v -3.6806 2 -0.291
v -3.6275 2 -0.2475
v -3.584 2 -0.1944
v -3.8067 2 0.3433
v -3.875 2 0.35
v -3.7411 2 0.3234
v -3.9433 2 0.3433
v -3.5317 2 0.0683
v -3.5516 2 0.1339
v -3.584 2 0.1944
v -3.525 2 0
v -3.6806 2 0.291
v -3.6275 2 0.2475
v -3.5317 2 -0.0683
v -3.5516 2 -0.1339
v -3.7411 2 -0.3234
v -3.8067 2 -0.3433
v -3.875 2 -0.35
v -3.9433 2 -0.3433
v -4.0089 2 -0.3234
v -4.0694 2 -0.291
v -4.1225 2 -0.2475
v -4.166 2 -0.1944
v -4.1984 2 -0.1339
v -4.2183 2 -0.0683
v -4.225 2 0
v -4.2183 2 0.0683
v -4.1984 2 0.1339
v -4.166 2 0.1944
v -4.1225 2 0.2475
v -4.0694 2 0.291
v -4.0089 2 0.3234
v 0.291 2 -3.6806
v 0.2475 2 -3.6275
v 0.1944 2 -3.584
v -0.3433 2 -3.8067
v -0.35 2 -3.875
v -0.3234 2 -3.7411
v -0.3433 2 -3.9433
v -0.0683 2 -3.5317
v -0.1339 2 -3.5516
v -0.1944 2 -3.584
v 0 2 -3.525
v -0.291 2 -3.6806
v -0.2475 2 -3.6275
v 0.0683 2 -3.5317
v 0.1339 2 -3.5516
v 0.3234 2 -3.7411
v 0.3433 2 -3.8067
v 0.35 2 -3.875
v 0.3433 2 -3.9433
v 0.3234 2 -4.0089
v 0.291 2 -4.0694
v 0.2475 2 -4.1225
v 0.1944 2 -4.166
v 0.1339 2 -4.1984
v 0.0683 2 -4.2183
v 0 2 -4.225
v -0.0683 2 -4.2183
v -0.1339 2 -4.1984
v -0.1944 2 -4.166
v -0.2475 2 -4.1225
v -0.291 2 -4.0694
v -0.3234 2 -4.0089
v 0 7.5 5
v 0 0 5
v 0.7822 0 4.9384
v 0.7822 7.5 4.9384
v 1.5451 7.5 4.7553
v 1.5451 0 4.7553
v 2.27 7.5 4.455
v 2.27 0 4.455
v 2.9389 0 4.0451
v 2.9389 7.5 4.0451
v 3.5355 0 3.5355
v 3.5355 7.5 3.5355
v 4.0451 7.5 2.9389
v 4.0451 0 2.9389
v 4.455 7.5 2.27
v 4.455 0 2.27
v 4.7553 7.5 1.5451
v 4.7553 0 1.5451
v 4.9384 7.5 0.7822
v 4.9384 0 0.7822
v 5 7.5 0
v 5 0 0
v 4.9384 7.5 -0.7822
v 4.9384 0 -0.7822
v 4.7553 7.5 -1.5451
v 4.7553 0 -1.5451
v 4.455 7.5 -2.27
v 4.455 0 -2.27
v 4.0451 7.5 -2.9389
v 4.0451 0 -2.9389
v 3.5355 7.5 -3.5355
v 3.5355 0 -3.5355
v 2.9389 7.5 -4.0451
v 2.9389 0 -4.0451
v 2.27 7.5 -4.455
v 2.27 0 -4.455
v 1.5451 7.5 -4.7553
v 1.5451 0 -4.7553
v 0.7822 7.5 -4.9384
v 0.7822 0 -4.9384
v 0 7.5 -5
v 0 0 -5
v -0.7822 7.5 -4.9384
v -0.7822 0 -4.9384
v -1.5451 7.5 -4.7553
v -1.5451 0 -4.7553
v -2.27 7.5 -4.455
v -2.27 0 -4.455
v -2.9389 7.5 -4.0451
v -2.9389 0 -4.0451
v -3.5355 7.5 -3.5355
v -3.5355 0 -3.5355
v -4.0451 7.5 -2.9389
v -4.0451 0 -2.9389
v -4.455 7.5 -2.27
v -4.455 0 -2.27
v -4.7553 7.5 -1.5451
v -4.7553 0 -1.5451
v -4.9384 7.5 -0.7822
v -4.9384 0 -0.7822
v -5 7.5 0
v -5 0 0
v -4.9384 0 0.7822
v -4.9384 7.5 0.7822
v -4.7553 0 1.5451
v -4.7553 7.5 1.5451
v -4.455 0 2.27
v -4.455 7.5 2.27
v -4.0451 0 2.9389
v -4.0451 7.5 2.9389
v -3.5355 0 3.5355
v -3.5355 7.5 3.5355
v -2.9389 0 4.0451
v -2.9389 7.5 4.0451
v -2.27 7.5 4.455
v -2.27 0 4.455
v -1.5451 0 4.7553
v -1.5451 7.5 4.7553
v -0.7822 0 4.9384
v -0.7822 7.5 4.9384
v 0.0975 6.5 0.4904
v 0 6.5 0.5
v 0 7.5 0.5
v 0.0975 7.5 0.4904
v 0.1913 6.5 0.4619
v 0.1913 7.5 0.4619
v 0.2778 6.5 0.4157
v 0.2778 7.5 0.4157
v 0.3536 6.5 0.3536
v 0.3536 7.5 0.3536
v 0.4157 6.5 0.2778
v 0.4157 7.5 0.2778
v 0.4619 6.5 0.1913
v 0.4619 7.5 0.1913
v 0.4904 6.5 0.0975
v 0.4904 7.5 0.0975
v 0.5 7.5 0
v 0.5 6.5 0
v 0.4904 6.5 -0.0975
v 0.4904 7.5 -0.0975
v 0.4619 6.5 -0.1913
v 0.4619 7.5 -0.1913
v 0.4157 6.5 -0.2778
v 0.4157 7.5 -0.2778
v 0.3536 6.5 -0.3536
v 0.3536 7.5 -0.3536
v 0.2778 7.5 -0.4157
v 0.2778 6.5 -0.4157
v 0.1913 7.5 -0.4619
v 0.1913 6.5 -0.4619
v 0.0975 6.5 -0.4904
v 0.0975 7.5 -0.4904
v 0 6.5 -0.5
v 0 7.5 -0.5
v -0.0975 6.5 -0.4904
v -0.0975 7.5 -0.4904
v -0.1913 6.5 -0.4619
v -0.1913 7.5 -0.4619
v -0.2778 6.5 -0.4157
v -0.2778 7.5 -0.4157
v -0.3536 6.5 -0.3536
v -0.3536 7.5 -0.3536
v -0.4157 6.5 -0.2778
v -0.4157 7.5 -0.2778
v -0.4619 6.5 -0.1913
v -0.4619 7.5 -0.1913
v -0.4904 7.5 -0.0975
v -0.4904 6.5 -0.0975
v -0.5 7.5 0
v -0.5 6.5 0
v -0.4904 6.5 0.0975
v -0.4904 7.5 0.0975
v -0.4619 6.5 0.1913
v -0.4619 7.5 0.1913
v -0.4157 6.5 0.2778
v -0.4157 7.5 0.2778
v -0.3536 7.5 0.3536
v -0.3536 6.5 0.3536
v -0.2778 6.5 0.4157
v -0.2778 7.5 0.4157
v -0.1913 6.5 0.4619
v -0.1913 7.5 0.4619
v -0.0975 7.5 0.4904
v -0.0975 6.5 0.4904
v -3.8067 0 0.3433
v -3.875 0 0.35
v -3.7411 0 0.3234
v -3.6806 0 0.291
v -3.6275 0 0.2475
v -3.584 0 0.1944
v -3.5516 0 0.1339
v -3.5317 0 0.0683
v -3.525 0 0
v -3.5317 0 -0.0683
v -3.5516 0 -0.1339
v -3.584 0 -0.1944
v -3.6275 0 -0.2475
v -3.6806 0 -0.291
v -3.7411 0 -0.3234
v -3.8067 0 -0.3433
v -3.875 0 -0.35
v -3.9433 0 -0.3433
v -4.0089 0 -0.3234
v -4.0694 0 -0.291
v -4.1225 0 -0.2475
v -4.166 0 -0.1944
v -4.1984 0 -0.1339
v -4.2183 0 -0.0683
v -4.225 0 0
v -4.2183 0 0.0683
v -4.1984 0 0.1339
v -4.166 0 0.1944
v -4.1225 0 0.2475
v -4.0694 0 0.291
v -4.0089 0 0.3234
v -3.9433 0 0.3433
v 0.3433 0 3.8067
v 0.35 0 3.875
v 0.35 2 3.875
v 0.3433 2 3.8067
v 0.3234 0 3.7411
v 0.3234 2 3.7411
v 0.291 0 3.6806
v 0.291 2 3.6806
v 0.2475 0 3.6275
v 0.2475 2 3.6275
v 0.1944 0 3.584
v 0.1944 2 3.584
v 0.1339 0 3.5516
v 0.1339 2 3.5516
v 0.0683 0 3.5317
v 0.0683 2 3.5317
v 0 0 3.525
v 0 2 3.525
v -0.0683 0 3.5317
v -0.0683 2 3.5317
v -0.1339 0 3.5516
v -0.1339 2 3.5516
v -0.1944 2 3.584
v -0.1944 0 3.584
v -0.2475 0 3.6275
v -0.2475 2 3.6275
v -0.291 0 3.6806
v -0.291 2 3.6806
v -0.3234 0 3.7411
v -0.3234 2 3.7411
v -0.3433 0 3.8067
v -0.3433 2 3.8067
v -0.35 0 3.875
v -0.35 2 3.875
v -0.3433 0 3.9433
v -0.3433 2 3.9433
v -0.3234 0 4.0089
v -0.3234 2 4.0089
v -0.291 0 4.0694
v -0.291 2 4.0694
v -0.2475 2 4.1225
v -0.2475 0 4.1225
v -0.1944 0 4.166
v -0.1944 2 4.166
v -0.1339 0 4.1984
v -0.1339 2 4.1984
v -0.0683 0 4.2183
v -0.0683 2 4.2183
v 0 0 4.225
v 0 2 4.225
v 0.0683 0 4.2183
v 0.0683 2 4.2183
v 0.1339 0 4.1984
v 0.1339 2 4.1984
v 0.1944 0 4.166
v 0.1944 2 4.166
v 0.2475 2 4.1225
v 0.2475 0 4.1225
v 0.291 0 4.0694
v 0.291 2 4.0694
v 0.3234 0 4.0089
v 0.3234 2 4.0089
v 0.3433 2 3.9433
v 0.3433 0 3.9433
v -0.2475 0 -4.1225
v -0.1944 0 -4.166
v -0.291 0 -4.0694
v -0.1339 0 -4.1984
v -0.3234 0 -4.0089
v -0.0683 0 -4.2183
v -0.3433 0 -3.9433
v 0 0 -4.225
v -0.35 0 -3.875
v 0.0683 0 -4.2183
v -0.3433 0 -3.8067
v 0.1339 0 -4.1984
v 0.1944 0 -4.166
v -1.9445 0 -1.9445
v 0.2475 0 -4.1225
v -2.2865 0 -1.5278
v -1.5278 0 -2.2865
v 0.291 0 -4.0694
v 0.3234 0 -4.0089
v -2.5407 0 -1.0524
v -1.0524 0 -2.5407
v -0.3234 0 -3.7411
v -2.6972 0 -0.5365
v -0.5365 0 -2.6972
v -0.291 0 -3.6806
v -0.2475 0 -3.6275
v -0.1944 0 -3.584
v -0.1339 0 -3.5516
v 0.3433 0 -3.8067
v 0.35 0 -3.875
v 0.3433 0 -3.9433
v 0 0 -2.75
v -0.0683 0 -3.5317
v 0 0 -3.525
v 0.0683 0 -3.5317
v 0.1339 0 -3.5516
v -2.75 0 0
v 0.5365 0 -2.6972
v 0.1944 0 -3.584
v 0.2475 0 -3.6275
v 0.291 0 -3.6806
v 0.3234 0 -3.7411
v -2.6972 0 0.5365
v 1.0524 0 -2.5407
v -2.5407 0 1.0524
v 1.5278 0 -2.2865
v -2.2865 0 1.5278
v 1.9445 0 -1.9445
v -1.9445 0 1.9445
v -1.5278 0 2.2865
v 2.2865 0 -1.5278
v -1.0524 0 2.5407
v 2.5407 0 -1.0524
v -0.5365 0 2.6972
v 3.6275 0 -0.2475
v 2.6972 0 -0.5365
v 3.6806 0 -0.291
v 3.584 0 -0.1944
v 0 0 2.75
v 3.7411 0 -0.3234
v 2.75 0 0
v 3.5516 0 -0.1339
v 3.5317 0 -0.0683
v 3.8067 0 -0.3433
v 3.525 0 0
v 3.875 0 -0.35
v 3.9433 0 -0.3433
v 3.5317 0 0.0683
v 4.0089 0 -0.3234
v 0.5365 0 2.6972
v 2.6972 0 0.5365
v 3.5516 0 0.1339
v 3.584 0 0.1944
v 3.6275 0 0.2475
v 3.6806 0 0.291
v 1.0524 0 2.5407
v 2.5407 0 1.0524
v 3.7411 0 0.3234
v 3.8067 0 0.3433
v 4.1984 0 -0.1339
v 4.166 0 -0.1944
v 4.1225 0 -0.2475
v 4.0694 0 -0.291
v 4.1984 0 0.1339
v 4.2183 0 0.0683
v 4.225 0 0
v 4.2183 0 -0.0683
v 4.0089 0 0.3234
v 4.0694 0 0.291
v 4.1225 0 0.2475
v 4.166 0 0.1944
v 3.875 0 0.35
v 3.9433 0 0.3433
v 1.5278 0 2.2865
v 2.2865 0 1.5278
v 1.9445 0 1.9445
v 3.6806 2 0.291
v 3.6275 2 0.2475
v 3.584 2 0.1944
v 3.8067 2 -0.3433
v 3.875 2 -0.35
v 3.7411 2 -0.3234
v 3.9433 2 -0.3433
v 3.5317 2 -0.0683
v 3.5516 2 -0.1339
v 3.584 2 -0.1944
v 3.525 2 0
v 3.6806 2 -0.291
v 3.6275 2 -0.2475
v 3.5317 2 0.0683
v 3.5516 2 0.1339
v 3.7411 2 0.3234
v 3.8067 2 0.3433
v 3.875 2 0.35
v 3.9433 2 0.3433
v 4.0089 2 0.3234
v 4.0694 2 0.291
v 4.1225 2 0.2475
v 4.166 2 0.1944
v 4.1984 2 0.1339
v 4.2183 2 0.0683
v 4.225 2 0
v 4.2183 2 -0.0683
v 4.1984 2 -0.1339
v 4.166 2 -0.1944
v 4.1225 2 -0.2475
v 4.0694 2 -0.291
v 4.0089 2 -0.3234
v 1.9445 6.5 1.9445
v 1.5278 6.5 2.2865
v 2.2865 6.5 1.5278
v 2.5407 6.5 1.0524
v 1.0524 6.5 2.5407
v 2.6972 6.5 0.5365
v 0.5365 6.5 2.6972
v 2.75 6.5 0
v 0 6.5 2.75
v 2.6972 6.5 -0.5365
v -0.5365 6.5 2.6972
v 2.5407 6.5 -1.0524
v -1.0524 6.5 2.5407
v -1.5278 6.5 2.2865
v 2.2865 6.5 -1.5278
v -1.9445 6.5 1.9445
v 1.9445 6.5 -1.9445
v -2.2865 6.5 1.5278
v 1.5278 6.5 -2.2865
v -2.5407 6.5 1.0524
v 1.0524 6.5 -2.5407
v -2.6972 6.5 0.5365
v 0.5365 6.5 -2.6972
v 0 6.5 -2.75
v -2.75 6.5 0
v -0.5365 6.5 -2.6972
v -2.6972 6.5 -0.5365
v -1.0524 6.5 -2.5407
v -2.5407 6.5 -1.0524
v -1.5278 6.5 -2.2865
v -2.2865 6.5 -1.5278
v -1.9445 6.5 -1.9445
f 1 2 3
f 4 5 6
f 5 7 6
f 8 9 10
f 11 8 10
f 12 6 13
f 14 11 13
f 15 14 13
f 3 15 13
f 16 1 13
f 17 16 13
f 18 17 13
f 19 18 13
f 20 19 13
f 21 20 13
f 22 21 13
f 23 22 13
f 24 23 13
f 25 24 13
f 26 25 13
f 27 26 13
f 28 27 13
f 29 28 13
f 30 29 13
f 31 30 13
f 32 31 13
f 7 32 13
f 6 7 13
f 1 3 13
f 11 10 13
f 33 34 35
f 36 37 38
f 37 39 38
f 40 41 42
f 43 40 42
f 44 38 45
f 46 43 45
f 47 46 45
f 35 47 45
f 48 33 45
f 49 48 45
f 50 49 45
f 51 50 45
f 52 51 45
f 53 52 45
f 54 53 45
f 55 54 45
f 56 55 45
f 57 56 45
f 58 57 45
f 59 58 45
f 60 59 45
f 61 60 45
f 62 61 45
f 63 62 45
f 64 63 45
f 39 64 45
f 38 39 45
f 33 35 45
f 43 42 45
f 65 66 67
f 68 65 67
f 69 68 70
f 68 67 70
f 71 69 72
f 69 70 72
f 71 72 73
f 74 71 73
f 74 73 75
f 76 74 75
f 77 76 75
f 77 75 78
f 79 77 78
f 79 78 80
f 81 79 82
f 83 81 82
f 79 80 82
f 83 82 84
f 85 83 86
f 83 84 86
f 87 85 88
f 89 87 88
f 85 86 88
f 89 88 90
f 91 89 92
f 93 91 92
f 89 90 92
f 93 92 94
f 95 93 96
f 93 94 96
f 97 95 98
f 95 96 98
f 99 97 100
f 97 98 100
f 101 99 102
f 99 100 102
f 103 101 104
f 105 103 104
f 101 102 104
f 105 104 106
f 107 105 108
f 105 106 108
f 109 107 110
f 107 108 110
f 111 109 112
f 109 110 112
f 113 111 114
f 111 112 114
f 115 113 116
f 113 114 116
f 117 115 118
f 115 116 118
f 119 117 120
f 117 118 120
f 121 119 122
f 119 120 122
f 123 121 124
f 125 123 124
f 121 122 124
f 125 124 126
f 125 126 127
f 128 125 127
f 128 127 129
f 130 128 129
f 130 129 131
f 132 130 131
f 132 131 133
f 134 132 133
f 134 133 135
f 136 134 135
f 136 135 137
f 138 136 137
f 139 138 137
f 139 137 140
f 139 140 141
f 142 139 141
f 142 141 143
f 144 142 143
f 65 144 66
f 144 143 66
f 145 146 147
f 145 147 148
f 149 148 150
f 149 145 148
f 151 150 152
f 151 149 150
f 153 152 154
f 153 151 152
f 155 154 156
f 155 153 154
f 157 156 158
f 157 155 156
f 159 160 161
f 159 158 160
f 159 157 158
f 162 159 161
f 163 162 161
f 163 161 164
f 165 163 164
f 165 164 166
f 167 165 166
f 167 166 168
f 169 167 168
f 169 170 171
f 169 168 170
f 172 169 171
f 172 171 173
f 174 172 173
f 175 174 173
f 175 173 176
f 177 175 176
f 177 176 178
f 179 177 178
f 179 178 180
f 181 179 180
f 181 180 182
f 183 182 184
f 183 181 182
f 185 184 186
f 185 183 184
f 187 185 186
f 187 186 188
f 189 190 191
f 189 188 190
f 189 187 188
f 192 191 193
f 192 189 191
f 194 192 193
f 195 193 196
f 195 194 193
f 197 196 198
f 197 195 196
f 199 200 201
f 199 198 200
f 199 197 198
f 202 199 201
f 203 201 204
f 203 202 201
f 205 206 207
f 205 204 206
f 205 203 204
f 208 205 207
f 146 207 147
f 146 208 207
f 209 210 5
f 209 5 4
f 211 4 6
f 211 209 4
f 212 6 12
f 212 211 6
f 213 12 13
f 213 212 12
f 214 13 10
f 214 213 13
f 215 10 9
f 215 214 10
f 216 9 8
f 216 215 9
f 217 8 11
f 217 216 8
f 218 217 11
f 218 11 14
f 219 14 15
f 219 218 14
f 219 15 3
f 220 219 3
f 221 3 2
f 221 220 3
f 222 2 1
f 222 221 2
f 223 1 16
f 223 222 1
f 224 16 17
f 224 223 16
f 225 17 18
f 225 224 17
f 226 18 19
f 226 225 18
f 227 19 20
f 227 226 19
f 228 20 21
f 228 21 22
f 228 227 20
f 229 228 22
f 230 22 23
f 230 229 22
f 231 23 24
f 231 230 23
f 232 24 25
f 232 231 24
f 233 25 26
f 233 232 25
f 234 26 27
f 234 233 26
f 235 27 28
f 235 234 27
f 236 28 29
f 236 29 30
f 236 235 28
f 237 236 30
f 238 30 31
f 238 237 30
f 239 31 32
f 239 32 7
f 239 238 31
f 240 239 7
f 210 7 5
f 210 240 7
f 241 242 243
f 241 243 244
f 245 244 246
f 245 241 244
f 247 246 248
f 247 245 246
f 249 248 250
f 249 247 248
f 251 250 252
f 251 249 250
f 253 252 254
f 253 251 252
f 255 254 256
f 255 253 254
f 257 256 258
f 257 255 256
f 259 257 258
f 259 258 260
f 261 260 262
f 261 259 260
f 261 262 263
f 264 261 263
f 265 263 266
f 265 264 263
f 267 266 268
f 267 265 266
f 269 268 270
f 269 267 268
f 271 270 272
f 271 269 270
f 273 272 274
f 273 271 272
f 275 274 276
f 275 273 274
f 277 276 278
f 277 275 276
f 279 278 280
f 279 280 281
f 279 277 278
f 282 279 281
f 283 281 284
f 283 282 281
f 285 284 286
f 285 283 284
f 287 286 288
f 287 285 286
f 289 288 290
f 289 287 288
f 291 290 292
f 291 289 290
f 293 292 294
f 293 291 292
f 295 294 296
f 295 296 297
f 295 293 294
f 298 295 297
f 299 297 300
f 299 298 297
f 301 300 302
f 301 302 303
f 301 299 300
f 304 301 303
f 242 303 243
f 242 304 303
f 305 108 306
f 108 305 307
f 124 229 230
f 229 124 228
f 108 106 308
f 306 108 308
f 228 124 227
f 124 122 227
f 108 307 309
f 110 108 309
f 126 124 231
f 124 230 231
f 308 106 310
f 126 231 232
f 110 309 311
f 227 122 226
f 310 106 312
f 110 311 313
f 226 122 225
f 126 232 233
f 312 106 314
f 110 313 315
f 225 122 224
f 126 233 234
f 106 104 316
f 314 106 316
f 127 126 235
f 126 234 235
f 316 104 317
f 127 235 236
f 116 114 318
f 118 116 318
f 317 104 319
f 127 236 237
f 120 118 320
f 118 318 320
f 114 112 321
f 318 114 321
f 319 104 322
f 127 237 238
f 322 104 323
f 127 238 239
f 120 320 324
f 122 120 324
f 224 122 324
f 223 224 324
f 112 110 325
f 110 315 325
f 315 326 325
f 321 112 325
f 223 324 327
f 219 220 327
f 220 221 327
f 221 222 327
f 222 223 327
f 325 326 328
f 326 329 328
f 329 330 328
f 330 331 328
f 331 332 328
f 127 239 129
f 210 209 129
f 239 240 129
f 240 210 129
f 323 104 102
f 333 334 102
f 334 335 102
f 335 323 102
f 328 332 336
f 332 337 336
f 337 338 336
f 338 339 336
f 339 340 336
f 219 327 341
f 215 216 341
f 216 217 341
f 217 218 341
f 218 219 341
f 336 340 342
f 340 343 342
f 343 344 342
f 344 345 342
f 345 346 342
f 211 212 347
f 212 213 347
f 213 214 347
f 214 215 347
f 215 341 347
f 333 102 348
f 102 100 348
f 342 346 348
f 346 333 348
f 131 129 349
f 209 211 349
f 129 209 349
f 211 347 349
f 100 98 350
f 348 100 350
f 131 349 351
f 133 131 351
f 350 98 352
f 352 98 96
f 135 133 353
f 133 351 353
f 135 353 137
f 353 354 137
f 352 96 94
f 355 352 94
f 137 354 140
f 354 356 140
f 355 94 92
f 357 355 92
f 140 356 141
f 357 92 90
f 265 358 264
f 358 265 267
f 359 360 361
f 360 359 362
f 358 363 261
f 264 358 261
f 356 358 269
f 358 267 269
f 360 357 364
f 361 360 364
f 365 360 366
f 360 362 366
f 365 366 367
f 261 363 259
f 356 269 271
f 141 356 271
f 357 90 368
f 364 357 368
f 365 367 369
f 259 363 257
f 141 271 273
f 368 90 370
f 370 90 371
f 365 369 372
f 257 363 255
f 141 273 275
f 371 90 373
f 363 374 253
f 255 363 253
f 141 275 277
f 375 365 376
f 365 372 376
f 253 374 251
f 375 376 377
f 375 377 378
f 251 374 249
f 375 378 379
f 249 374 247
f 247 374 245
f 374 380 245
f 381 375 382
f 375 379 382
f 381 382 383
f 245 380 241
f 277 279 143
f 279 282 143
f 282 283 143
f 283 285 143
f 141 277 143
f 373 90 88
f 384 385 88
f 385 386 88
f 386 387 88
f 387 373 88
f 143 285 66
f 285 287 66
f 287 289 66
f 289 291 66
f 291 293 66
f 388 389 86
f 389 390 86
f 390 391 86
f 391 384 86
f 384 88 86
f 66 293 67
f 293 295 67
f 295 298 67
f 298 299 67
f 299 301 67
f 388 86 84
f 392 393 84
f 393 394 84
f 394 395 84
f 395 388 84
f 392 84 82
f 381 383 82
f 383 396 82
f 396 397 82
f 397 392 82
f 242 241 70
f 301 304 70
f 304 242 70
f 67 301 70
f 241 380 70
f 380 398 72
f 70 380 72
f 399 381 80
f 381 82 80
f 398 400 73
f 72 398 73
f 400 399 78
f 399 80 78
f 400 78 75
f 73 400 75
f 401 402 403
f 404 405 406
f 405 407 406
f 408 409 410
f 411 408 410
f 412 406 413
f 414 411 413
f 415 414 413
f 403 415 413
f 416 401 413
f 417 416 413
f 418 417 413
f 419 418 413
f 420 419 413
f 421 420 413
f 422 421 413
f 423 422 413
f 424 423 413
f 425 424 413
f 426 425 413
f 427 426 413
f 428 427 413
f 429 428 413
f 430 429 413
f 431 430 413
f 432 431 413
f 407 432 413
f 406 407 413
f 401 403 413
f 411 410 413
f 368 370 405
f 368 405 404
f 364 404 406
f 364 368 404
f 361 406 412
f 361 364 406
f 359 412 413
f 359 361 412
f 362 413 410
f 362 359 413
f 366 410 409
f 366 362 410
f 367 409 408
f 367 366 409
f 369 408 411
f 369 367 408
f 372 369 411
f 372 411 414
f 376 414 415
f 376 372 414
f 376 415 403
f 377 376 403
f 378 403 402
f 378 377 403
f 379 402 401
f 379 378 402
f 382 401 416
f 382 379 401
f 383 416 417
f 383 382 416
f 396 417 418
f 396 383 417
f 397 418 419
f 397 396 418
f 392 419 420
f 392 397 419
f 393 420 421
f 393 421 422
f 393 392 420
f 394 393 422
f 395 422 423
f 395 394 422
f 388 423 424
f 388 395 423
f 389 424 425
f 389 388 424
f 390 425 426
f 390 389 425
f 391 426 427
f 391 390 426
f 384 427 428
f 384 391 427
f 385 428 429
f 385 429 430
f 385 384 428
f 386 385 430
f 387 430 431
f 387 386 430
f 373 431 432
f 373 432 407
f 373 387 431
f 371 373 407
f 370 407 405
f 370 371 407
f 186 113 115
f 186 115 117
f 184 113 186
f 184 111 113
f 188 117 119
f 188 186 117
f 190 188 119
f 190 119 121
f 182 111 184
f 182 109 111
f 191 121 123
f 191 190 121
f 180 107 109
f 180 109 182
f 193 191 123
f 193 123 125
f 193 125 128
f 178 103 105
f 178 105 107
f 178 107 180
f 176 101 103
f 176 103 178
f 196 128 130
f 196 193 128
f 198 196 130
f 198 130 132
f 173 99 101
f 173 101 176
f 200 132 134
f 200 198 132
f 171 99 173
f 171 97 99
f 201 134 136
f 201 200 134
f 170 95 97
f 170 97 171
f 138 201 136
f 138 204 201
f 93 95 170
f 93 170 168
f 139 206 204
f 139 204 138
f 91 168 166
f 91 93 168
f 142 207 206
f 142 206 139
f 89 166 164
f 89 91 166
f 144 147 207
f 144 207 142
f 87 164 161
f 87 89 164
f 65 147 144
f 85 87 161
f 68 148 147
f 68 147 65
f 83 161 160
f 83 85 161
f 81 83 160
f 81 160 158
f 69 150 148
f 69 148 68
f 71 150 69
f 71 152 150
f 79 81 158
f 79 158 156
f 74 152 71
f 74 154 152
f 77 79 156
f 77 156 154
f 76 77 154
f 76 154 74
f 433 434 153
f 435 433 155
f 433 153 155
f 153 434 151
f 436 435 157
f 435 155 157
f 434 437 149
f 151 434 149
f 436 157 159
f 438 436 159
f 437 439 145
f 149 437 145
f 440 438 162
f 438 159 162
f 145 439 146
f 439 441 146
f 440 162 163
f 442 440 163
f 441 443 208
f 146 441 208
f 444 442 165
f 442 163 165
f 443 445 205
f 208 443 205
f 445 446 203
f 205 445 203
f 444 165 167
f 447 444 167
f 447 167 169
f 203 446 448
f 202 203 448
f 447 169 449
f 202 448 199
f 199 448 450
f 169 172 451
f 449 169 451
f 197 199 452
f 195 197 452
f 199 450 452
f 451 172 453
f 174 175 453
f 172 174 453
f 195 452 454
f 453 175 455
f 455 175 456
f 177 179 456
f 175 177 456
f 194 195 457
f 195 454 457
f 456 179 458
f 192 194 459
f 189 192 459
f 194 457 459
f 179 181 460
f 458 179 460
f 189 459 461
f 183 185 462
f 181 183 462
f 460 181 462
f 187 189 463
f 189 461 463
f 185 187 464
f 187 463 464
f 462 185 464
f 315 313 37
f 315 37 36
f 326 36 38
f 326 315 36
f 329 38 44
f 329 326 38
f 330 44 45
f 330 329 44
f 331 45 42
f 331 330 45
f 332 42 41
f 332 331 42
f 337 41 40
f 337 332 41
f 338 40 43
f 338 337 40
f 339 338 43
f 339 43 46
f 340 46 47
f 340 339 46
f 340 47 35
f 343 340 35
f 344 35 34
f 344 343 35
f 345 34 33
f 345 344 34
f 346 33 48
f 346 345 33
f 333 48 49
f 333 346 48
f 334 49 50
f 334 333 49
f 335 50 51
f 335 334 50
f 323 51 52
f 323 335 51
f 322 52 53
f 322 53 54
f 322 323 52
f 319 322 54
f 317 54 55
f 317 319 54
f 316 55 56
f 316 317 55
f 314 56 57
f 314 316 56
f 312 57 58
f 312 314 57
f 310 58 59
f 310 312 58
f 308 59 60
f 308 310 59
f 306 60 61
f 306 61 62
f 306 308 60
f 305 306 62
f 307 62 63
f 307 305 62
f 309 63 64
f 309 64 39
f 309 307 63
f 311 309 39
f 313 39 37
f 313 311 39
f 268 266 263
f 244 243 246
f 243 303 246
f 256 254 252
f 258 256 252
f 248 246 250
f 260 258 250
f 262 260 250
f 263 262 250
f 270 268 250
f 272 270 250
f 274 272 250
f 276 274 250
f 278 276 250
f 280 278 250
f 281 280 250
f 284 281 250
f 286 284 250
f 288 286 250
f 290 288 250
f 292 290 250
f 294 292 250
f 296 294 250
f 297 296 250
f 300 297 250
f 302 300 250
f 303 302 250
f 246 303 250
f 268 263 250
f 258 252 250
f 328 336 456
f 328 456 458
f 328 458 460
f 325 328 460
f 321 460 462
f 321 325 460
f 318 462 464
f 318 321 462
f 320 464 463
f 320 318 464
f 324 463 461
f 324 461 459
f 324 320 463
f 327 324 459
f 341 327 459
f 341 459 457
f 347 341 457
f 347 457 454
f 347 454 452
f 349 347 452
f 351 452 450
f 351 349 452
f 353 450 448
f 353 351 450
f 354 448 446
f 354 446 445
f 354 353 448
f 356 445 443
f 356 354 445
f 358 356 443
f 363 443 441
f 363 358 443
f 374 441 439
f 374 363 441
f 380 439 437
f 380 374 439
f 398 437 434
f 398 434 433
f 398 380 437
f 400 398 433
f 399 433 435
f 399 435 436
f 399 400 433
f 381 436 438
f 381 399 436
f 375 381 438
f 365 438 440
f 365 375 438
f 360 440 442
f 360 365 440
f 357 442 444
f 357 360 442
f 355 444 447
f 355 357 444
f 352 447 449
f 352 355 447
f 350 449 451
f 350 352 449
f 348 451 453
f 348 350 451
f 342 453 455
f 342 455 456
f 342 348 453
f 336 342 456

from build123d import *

# Parameters (mm, degrees)
SKETCH_1_R               = 5
EXTRUDE_1_DEPTH          = 7.5
SKETCH_1_5_R             = 2.75
CUT_EXTRUDE_1_DEPTH      = 6.5
SKETCH_1_6_R             = 0.5
CUT_EXTRUDE_2_DEPTH      = 11.307764064
SKETCH_1_7_R             = 0.35
CUT_EXTRUDE_3_DEPTH      = 2
PATTERN_CIRCULAR_1_COUNT = 4


with BuildPart() as part:
    # 草图1 → 凸台-拉伸1 (new body)
    with BuildSketch(Plane(origin=(0, 0, 0), x_dir=(1, 0, 0), z_dir=(0, 1, 0))):
        Circle(SKETCH_1_R)
    extrude(amount=EXTRUDE_1_DEPTH)

    # 草图1<5> → 切除-拉伸1 (cut)
    with BuildSketch(Plane(origin=(0, 0, 0), x_dir=(1, 0, 0), z_dir=(0, 1, 0))):
        Circle(SKETCH_1_5_R)
    extrude(amount=CUT_EXTRUDE_1_DEPTH, mode=Mode.SUBTRACT)

    # 草图1<6> → 切除-拉伸2 (cut, through all)
    with BuildSketch(Plane(origin=(0, 0, 0), x_dir=(1, 0, 0), z_dir=(0, 1, 0))):
        Circle(SKETCH_1_6_R)
    extrude(amount=CUT_EXTRUDE_2_DEPTH, mode=Mode.SUBTRACT)

    # 草图1<7> → 切除-拉伸3 (cut)
    with BuildSketch(Plane(origin=(0, 0, 0), x_dir=(1, 0, 0), z_dir=(0, 1, 0))):
        with Locations((-3.875, 0)):
            Circle(SKETCH_1_7_R)
    cut_extrude_3 = extrude(amount=CUT_EXTRUDE_3_DEPTH, mode=Mode.SUBTRACT)

    # 阵列(圆周)1: 切除-拉伸3 ×4 about axis
    pattern_circular_1_axis = Axis((0, 7.5, 0), (0, -1, 0))
    for i in range(1, PATTERN_CIRCULAR_1_COUNT):
        add(cut_extrude_3.rotate(pattern_circular_1_axis, i * 360 / PATTERN_CIRCULAR_1_COUNT), mode=Mode.SUBTRACT)


solid = part.part
